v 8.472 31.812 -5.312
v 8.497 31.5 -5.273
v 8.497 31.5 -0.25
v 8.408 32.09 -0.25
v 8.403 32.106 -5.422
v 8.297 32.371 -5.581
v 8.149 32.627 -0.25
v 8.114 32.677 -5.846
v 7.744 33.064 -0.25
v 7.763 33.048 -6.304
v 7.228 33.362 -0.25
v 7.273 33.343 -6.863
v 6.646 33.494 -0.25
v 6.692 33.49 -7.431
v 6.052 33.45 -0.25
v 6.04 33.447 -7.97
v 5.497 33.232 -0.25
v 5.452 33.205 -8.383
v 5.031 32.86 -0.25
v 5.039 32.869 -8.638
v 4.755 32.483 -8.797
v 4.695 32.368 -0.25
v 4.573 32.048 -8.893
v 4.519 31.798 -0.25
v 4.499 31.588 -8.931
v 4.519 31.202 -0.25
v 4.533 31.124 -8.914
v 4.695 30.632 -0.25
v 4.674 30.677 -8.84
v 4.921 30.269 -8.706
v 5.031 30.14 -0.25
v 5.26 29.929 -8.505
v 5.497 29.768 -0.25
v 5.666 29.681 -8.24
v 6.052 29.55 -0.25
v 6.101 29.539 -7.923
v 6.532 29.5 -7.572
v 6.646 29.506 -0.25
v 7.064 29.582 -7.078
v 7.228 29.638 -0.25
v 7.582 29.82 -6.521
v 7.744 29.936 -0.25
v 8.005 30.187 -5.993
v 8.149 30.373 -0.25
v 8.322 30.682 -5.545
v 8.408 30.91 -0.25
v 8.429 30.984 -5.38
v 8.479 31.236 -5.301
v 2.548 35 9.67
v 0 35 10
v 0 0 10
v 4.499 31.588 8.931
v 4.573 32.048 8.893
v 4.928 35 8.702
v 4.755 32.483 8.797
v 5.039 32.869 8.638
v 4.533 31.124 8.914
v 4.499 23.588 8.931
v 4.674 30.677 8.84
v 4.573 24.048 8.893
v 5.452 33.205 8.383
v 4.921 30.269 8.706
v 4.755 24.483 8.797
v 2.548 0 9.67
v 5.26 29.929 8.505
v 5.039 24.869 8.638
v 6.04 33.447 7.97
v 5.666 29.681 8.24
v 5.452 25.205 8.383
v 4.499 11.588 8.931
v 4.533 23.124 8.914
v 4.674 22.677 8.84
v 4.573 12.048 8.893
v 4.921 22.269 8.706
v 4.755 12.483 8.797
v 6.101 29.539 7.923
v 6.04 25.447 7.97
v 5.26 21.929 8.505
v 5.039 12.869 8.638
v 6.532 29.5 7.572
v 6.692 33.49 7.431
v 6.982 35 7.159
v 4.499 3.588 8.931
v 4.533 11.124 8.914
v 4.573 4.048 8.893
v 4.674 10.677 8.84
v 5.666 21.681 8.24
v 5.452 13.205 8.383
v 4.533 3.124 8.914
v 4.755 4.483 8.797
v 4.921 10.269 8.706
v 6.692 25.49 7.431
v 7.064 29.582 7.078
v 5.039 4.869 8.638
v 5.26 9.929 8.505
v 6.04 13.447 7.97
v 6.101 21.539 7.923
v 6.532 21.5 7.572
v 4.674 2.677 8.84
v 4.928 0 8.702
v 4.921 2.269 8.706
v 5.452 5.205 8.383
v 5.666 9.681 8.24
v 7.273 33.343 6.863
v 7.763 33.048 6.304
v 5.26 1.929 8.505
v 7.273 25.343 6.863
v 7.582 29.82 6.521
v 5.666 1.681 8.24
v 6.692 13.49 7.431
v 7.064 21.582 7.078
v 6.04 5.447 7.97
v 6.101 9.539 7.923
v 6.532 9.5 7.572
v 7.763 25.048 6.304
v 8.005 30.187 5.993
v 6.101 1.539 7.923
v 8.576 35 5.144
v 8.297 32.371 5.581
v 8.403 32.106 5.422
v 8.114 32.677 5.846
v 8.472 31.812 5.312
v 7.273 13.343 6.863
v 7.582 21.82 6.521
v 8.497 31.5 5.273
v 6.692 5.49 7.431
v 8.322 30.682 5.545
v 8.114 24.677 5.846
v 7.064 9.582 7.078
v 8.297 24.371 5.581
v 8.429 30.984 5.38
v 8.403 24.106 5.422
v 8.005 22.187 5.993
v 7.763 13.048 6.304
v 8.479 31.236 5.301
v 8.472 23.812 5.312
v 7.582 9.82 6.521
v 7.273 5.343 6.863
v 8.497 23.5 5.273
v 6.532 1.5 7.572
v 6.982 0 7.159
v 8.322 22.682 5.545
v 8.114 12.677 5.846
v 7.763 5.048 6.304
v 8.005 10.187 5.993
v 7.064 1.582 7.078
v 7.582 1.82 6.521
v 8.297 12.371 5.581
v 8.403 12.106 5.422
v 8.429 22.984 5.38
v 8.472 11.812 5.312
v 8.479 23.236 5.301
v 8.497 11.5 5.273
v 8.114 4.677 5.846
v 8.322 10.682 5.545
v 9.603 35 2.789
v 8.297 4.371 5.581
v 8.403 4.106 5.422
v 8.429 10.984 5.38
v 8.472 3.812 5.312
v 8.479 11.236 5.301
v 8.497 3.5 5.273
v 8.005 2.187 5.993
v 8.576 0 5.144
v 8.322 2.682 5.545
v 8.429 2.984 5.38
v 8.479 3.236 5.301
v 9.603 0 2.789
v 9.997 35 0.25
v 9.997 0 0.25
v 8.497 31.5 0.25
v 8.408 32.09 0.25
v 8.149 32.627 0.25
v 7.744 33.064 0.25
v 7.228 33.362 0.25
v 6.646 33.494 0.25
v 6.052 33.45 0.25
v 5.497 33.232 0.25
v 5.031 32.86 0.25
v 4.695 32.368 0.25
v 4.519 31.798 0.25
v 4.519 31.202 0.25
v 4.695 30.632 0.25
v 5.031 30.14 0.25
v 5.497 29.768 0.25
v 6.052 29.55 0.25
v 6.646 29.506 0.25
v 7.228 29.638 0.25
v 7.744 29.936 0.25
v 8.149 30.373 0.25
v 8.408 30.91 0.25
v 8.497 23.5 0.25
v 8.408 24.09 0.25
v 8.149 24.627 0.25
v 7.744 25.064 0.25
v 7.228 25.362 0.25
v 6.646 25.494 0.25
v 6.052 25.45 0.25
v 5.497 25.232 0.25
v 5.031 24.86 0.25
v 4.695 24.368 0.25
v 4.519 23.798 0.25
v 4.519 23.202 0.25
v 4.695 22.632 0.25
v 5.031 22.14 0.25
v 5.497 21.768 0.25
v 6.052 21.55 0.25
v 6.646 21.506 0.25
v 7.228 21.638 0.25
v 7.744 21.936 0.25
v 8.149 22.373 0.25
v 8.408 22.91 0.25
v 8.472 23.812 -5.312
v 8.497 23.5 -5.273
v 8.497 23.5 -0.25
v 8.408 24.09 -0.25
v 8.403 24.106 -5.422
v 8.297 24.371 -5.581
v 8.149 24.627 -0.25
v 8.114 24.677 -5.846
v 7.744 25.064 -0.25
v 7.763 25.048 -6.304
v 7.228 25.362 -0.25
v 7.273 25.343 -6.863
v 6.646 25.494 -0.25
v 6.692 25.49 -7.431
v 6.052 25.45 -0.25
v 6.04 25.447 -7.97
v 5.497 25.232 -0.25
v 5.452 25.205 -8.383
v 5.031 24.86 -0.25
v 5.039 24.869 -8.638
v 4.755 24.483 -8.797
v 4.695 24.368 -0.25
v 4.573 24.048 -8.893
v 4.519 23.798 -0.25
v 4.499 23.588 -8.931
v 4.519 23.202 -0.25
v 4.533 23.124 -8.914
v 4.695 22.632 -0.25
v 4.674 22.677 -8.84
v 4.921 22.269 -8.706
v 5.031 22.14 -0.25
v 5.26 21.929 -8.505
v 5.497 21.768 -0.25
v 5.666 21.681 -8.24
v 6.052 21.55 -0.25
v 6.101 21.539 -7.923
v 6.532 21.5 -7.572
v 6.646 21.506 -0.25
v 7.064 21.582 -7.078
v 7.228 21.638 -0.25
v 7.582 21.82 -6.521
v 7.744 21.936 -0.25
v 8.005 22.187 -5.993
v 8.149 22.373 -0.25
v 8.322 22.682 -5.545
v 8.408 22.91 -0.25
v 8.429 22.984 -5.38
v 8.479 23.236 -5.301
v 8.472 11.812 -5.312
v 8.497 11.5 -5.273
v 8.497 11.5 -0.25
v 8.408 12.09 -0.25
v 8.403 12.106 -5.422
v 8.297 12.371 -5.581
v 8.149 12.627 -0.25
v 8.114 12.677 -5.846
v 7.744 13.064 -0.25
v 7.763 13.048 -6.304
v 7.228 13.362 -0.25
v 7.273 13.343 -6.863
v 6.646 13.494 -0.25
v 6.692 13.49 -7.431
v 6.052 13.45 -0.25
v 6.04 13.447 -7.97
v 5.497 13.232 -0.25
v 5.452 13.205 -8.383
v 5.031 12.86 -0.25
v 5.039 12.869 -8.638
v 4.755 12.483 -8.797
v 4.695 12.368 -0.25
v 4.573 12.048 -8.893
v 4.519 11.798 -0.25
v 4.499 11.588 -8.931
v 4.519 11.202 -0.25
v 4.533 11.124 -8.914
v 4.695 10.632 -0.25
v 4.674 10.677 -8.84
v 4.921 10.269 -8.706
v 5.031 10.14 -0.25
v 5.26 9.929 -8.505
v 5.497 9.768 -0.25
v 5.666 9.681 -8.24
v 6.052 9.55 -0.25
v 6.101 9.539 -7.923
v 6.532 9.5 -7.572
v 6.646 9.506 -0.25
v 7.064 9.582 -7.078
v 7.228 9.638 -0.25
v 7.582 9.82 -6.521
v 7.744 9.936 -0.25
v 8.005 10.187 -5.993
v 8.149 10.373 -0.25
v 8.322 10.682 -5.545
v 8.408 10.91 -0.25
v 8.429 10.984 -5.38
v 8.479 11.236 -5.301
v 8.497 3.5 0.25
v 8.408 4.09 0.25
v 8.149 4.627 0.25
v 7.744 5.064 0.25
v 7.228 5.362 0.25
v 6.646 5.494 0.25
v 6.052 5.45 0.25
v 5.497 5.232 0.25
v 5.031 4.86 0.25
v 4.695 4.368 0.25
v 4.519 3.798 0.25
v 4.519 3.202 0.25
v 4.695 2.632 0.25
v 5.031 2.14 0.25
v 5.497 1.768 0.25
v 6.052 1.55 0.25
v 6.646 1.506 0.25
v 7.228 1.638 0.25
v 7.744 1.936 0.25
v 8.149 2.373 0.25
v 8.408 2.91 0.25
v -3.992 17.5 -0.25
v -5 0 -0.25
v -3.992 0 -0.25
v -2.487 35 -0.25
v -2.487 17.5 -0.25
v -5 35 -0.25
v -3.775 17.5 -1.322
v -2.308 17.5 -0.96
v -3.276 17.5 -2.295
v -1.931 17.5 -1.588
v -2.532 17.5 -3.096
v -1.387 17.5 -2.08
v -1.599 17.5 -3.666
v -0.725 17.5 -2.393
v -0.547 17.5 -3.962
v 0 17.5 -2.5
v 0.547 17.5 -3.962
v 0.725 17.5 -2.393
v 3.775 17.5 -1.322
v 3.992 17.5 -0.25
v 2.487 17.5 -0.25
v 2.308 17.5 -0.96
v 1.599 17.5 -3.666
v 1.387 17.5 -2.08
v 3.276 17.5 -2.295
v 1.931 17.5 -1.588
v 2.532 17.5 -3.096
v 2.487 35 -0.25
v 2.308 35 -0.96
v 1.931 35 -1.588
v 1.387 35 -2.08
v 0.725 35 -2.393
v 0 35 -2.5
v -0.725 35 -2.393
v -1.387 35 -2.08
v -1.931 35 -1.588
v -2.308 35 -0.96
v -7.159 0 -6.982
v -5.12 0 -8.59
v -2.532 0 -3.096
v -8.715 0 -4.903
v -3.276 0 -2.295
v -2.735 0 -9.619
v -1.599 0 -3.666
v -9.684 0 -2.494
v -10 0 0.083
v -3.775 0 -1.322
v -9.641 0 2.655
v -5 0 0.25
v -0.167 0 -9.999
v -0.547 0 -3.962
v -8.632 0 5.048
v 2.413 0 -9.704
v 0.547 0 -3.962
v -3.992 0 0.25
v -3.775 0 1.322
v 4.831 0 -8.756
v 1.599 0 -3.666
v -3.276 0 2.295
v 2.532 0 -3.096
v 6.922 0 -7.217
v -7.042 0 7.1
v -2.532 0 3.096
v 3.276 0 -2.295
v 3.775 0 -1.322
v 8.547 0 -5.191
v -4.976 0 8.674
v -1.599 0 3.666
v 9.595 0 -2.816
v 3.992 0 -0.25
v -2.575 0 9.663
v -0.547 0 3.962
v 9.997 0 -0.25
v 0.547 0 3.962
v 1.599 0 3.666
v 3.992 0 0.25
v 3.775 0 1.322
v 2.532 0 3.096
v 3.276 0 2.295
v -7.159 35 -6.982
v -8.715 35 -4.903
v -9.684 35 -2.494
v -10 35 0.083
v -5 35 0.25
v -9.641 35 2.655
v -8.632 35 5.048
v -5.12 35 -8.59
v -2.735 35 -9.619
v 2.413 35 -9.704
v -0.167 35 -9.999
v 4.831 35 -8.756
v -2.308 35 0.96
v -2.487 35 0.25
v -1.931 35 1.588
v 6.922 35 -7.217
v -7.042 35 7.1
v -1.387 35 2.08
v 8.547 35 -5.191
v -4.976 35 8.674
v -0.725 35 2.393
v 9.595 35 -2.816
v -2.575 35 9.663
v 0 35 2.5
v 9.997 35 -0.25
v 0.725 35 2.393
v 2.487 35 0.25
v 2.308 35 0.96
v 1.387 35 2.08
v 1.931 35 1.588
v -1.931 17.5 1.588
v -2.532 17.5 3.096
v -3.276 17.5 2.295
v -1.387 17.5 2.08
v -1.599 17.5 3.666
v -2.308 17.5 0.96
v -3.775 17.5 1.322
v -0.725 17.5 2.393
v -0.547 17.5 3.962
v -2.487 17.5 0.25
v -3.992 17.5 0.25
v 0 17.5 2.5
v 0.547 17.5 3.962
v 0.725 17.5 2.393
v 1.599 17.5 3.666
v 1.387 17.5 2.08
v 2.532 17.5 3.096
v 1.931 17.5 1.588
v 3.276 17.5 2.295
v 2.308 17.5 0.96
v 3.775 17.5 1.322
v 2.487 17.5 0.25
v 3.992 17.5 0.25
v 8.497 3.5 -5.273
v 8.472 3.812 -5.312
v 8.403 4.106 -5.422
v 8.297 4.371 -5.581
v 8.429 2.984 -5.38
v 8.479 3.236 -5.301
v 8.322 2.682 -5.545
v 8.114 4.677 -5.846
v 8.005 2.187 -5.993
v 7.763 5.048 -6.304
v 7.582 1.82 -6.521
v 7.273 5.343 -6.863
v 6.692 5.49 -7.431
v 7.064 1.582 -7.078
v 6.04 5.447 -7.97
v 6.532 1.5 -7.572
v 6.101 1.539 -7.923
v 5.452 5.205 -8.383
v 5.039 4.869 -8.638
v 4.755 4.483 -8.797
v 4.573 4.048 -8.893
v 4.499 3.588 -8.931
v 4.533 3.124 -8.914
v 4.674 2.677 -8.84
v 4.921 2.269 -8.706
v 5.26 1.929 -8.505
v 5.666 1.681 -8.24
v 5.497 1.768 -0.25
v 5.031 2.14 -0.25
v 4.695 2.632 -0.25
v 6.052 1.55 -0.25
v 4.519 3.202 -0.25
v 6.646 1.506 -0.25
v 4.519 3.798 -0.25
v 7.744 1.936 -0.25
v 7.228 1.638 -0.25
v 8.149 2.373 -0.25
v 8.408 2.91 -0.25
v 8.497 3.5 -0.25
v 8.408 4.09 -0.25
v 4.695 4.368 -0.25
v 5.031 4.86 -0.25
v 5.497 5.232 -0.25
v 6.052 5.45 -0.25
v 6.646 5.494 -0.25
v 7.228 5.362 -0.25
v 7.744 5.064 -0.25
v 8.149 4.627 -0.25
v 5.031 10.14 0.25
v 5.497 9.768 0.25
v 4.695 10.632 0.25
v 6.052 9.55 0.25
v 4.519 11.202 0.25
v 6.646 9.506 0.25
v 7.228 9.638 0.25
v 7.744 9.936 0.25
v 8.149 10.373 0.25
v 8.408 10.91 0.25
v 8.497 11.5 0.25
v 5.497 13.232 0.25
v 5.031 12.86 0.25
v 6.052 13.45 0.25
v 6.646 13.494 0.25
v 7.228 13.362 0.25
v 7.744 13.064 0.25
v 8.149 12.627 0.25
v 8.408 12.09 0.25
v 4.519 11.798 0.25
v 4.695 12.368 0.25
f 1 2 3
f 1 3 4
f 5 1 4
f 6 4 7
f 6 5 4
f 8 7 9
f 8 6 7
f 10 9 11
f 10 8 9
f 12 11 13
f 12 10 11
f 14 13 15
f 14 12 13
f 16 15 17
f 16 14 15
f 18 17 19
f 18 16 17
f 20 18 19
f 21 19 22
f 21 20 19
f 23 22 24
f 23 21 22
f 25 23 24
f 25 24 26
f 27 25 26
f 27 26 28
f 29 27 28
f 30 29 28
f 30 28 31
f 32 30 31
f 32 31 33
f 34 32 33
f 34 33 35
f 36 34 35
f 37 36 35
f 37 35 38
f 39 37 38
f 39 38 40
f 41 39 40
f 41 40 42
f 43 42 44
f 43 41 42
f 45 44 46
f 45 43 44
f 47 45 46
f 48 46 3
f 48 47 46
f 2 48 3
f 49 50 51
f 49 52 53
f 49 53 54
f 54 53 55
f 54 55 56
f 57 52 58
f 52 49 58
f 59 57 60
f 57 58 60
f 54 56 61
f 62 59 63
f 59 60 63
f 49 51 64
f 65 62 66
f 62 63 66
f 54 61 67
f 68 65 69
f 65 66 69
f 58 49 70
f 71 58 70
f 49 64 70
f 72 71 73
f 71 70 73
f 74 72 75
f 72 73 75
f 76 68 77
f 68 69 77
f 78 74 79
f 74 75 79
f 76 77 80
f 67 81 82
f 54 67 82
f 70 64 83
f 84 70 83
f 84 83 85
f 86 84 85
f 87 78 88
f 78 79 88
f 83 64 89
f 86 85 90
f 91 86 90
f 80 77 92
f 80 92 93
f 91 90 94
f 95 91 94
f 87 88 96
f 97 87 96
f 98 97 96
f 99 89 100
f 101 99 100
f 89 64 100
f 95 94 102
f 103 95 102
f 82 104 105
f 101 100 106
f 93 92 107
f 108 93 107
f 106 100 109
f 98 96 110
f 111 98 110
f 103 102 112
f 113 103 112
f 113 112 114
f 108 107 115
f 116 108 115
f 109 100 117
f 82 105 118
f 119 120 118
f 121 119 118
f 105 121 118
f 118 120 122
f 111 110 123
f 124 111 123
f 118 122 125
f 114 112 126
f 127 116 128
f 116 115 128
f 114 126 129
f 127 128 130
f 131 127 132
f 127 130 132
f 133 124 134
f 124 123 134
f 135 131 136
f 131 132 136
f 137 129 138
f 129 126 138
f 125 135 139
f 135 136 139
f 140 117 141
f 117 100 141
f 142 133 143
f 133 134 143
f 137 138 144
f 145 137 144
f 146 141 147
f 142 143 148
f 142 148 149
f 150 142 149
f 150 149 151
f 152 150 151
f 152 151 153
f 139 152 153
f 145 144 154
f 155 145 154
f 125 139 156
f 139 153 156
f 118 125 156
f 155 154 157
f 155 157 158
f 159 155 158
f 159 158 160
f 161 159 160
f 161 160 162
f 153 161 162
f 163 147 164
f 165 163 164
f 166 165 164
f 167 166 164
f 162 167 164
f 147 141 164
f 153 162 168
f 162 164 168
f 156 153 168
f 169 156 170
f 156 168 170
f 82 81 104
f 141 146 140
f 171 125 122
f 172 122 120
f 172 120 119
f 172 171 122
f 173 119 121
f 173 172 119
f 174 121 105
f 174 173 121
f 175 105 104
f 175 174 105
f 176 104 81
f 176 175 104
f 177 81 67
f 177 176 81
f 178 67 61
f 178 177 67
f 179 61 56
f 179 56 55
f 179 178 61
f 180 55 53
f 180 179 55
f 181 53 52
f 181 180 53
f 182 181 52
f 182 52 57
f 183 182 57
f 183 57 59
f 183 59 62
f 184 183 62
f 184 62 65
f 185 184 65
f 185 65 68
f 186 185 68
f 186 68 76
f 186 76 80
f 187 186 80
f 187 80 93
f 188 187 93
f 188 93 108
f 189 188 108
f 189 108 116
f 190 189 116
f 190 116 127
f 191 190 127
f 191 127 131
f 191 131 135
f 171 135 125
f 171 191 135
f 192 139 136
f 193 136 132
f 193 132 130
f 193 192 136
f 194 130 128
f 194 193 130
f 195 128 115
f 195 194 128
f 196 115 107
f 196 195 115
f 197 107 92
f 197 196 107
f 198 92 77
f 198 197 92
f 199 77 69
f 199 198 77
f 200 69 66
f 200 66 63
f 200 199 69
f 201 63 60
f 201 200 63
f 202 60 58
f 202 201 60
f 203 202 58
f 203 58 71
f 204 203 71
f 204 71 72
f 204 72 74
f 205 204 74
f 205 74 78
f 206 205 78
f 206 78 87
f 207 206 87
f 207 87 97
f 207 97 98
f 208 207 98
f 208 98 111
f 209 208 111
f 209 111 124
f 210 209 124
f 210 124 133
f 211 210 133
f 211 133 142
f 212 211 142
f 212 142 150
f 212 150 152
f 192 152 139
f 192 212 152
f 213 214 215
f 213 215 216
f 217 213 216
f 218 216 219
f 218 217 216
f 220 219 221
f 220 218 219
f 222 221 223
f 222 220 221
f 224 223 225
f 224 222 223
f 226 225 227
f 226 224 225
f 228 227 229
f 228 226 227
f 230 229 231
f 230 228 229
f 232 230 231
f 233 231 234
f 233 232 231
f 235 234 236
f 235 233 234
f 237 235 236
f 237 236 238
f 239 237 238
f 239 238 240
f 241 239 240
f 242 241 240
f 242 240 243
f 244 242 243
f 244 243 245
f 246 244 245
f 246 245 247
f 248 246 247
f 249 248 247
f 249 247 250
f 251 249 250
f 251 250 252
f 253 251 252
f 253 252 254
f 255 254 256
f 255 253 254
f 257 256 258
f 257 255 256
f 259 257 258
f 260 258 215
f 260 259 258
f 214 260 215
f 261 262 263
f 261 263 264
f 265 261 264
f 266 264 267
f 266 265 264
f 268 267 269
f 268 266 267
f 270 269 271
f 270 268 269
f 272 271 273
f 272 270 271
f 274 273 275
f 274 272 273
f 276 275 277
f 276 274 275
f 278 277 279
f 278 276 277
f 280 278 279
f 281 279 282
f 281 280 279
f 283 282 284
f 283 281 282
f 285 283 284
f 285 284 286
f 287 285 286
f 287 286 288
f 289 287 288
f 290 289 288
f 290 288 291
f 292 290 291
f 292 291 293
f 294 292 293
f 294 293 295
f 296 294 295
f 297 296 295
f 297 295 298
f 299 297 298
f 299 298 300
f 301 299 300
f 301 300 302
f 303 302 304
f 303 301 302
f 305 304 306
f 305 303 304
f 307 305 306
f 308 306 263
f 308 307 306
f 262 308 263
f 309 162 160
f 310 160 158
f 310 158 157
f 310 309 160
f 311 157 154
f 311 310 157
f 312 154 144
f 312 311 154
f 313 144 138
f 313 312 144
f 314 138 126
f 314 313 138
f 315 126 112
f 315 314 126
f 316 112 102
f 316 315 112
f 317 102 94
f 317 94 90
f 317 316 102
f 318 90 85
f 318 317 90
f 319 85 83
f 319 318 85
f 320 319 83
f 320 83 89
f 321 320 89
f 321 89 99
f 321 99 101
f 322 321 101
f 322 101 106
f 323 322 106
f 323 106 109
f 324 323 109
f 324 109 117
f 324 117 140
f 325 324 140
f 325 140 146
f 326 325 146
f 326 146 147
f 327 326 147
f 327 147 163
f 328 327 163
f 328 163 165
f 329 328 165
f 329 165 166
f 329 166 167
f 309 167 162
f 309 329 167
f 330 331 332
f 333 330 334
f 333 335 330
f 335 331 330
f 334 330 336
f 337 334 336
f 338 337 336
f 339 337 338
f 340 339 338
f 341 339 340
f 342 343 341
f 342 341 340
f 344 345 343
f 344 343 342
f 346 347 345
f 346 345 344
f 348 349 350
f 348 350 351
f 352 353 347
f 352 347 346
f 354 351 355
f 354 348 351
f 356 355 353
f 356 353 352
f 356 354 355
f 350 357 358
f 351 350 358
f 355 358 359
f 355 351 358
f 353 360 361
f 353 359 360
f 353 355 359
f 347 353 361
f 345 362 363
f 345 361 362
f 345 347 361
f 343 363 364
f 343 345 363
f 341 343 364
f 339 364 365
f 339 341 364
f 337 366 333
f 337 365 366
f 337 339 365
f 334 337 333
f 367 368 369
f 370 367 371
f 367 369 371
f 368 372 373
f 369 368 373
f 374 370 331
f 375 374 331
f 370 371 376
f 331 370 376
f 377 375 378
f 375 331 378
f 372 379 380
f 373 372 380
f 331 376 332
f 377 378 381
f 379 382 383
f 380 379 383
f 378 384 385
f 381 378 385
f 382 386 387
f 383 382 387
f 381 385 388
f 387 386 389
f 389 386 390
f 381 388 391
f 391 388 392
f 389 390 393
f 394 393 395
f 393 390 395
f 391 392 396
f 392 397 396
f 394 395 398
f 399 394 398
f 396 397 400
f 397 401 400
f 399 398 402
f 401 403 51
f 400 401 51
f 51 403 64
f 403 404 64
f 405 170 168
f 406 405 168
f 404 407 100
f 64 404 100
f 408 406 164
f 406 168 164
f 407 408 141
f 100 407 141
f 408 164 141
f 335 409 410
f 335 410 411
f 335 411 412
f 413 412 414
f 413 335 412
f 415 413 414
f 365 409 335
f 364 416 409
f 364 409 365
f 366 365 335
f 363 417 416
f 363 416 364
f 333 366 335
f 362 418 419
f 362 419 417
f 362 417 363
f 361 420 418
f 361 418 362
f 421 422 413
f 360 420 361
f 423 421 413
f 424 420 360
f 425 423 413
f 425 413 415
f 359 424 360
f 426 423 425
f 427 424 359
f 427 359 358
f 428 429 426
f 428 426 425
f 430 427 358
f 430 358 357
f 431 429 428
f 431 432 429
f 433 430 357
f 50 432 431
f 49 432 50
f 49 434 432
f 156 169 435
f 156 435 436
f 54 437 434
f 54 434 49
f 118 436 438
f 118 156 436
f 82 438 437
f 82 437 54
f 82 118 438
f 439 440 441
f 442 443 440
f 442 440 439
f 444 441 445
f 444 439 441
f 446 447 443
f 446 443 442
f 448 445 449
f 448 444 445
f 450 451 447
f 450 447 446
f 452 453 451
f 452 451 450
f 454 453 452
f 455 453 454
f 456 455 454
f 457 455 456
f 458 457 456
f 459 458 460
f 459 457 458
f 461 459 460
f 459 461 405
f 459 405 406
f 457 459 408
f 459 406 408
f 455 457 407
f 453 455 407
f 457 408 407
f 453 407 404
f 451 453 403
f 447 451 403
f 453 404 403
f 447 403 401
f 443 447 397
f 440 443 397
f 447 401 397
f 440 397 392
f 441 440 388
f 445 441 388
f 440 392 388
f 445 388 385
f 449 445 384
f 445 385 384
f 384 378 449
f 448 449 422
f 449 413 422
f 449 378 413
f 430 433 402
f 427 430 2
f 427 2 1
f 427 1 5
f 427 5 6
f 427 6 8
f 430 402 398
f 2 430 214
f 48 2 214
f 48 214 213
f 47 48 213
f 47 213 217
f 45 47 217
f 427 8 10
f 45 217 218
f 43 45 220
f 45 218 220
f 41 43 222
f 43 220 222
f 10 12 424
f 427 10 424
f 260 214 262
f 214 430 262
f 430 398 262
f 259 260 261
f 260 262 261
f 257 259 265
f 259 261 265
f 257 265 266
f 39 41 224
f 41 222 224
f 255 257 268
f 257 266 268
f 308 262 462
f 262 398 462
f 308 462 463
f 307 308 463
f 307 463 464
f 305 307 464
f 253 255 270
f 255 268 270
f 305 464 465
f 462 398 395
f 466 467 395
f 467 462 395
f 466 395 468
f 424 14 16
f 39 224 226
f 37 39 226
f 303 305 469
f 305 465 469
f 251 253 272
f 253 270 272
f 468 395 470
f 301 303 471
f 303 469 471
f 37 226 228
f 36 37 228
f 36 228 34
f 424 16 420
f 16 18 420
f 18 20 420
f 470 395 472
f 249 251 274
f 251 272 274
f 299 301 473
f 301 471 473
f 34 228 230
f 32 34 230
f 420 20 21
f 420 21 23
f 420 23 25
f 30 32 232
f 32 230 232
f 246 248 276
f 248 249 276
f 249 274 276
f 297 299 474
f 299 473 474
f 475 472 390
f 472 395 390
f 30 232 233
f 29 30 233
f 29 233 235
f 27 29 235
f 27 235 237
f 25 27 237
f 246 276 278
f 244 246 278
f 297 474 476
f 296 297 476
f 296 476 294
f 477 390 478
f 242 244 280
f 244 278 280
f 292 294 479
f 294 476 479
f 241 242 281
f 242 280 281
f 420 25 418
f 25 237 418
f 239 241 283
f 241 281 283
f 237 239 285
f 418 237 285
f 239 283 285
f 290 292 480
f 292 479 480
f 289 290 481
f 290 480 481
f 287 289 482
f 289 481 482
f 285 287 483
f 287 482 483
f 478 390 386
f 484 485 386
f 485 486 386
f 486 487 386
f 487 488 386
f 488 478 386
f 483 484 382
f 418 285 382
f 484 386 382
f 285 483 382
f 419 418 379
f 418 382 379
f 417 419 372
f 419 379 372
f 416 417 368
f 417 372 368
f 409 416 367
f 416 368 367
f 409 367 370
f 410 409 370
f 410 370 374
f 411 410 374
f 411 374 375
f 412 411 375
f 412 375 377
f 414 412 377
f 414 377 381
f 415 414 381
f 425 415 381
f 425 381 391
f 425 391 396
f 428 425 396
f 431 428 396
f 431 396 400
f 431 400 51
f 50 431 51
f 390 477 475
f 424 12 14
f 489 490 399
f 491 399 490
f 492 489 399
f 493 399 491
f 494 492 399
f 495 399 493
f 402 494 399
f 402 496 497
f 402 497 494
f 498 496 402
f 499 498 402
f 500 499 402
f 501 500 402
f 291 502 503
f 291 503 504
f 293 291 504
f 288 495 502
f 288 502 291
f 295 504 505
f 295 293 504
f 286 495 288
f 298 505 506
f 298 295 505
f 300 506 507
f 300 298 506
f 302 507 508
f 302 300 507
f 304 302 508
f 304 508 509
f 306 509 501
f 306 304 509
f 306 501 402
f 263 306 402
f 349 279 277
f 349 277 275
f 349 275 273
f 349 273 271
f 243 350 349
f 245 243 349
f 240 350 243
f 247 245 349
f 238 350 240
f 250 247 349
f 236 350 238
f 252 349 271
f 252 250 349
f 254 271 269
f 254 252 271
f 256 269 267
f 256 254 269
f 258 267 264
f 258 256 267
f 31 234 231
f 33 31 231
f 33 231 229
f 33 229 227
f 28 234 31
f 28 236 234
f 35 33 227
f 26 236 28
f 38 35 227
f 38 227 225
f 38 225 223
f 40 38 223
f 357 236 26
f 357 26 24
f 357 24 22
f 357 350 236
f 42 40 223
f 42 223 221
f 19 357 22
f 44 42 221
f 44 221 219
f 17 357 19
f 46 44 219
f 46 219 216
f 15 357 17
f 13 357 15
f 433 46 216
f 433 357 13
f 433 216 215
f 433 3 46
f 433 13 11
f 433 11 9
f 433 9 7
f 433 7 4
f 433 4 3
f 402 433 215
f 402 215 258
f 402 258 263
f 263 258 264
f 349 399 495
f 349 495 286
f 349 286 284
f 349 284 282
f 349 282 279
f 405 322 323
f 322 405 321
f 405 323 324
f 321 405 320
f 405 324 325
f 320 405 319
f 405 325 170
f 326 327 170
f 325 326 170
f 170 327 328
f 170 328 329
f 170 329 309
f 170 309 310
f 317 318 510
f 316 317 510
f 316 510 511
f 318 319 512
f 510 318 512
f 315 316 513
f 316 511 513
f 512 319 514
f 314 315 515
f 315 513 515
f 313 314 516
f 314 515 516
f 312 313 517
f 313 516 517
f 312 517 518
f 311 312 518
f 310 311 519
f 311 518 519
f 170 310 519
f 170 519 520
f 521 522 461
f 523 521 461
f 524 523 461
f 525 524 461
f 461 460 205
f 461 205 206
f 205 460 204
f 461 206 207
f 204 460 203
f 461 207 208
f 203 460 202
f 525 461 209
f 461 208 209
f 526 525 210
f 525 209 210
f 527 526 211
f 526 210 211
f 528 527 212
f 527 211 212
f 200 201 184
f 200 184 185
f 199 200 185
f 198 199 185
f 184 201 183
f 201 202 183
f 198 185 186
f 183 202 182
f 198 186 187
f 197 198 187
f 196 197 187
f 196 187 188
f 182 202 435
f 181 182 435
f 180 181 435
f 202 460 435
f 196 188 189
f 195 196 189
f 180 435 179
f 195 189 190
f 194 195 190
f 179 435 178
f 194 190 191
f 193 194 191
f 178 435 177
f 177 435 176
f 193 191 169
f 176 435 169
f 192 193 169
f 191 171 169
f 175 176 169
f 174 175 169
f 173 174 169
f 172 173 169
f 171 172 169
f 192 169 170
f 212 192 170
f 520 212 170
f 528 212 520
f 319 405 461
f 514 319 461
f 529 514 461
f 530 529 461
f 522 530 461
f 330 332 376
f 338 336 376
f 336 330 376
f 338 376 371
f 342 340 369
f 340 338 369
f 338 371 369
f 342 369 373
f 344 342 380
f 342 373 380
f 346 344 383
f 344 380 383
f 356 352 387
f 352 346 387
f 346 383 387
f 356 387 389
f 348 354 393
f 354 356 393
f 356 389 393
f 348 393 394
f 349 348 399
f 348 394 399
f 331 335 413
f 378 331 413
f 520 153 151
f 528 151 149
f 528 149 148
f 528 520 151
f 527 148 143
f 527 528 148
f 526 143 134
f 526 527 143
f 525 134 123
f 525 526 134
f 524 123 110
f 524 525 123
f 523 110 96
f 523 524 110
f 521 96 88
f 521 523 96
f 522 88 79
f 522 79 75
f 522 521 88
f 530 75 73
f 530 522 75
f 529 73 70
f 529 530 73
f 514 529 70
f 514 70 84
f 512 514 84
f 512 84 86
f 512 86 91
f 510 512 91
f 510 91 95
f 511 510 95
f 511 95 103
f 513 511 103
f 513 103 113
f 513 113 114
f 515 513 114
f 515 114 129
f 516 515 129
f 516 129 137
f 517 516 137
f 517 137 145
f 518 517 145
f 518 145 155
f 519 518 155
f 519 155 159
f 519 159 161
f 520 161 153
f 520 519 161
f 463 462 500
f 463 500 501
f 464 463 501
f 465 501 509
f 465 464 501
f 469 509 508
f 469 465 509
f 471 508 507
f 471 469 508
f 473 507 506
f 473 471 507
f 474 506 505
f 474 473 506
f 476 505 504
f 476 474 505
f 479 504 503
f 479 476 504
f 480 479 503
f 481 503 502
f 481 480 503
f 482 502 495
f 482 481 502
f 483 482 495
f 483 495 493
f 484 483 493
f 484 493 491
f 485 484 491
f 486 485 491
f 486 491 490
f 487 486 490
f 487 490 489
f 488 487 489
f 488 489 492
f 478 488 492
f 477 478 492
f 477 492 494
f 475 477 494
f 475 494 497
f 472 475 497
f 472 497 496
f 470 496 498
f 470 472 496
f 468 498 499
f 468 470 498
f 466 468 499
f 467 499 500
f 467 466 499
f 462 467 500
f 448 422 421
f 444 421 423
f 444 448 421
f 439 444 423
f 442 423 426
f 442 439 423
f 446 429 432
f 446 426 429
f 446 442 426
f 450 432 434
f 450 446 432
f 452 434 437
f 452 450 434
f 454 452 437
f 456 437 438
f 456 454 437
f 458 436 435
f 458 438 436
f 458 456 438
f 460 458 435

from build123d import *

# Parameters (mm, degrees)
SKETCH1_R               = 10
BOSS_EXTRUDE1_DEPTH     = 35
CUT_EXTRUDE1_DEPTH      = 38.749172176
CUT_EXTRUDE1_DEPTH_BACK = 38.749172176
SKETCH2_R               = 2.5
SKETCH3_R               = 4
CUT_EXTRUDE2_DEPTH      = 17.5
CUT_EXTRUDE3_DEPTH      = 38.749172176
CUT_EXTRUDE3_DEPTH_BACK = 38.749172176
SKETCH4_W               = 15
SKETCH4_H               = 0.5
CUT_EXTRUDE4_DEPTH      = 38.749172176
CUT_EXTRUDE4_DEPTH_BACK = 38.749172176
SKETCH5_R               = 2


with BuildPart() as part:
    # Sketch1 → Boss-Extrude1 (new body)
    with BuildSketch(Plane(origin=(0, 0, 0), x_dir=(1, 0, 0), z_dir=(0, 1, 0))):
        with Locations(Location((0, 0, 0), (0, 0, 270))):
            Circle(SKETCH1_R)
    extrude(amount=BOSS_EXTRUDE1_DEPTH)

    # Sketch2 → Cut-Extrude1 (cut, two sides: drawn at the far end of the back side and taken through both)
    with BuildSketch(Plane(origin=(0, 35, 0), x_dir=(1, 0, 0), z_dir=(0, 1, 0)).offset(-CUT_EXTRUDE1_DEPTH_BACK)):
        with Locations(Location((0, 0, 0), (0, 0, 270))):
            Circle(SKETCH2_R)
    extrude(amount=CUT_EXTRUDE1_DEPTH + CUT_EXTRUDE1_DEPTH_BACK, mode=Mode.SUBTRACT)

    # Sketch3 → Cut-Extrude2 (cut)
    with BuildSketch(Plane.XZ):
        with Locations(Location((0, 0, 0), (0, 0, 270))):
            Circle(SKETCH3_R)
    extrude(amount=-CUT_EXTRUDE2_DEPTH, mode=Mode.SUBTRACT)

    # Sketch4 → Cut-Extrude3 (cut, two sides: drawn at the far end of the back side and taken through both)
    with BuildSketch(Plane.XZ.offset(-CUT_EXTRUDE3_DEPTH_BACK)):
        with Locations((2.5, 0)):
            Rectangle(SKETCH4_W, SKETCH4_H)
    extrude(amount=CUT_EXTRUDE3_DEPTH + CUT_EXTRUDE3_DEPTH_BACK, mode=Mode.SUBTRACT)

    # Sketch5 → Cut-Extrude4 (cut, two sides: drawn at the far end of the back side and taken through both)
    with BuildSketch(Plane.XY.offset(-CUT_EXTRUDE4_DEPTH_BACK)):
        with Locations((6.496874512, 31.5)):
            Circle(SKETCH5_R)
        with Locations((6.496874512, 23.5)):
            Circle(SKETCH5_R)
        with Locations((6.496874512, 11.5)):
            Circle(SKETCH5_R)
        with Locations((6.496874512, 3.5)):
            Circle(SKETCH5_R)
    extrude(amount=CUT_EXTRUDE4_DEPTH + CUT_EXTRUDE4_DEPTH_BACK, mode=Mode.SUBTRACT)


solid = part.part
